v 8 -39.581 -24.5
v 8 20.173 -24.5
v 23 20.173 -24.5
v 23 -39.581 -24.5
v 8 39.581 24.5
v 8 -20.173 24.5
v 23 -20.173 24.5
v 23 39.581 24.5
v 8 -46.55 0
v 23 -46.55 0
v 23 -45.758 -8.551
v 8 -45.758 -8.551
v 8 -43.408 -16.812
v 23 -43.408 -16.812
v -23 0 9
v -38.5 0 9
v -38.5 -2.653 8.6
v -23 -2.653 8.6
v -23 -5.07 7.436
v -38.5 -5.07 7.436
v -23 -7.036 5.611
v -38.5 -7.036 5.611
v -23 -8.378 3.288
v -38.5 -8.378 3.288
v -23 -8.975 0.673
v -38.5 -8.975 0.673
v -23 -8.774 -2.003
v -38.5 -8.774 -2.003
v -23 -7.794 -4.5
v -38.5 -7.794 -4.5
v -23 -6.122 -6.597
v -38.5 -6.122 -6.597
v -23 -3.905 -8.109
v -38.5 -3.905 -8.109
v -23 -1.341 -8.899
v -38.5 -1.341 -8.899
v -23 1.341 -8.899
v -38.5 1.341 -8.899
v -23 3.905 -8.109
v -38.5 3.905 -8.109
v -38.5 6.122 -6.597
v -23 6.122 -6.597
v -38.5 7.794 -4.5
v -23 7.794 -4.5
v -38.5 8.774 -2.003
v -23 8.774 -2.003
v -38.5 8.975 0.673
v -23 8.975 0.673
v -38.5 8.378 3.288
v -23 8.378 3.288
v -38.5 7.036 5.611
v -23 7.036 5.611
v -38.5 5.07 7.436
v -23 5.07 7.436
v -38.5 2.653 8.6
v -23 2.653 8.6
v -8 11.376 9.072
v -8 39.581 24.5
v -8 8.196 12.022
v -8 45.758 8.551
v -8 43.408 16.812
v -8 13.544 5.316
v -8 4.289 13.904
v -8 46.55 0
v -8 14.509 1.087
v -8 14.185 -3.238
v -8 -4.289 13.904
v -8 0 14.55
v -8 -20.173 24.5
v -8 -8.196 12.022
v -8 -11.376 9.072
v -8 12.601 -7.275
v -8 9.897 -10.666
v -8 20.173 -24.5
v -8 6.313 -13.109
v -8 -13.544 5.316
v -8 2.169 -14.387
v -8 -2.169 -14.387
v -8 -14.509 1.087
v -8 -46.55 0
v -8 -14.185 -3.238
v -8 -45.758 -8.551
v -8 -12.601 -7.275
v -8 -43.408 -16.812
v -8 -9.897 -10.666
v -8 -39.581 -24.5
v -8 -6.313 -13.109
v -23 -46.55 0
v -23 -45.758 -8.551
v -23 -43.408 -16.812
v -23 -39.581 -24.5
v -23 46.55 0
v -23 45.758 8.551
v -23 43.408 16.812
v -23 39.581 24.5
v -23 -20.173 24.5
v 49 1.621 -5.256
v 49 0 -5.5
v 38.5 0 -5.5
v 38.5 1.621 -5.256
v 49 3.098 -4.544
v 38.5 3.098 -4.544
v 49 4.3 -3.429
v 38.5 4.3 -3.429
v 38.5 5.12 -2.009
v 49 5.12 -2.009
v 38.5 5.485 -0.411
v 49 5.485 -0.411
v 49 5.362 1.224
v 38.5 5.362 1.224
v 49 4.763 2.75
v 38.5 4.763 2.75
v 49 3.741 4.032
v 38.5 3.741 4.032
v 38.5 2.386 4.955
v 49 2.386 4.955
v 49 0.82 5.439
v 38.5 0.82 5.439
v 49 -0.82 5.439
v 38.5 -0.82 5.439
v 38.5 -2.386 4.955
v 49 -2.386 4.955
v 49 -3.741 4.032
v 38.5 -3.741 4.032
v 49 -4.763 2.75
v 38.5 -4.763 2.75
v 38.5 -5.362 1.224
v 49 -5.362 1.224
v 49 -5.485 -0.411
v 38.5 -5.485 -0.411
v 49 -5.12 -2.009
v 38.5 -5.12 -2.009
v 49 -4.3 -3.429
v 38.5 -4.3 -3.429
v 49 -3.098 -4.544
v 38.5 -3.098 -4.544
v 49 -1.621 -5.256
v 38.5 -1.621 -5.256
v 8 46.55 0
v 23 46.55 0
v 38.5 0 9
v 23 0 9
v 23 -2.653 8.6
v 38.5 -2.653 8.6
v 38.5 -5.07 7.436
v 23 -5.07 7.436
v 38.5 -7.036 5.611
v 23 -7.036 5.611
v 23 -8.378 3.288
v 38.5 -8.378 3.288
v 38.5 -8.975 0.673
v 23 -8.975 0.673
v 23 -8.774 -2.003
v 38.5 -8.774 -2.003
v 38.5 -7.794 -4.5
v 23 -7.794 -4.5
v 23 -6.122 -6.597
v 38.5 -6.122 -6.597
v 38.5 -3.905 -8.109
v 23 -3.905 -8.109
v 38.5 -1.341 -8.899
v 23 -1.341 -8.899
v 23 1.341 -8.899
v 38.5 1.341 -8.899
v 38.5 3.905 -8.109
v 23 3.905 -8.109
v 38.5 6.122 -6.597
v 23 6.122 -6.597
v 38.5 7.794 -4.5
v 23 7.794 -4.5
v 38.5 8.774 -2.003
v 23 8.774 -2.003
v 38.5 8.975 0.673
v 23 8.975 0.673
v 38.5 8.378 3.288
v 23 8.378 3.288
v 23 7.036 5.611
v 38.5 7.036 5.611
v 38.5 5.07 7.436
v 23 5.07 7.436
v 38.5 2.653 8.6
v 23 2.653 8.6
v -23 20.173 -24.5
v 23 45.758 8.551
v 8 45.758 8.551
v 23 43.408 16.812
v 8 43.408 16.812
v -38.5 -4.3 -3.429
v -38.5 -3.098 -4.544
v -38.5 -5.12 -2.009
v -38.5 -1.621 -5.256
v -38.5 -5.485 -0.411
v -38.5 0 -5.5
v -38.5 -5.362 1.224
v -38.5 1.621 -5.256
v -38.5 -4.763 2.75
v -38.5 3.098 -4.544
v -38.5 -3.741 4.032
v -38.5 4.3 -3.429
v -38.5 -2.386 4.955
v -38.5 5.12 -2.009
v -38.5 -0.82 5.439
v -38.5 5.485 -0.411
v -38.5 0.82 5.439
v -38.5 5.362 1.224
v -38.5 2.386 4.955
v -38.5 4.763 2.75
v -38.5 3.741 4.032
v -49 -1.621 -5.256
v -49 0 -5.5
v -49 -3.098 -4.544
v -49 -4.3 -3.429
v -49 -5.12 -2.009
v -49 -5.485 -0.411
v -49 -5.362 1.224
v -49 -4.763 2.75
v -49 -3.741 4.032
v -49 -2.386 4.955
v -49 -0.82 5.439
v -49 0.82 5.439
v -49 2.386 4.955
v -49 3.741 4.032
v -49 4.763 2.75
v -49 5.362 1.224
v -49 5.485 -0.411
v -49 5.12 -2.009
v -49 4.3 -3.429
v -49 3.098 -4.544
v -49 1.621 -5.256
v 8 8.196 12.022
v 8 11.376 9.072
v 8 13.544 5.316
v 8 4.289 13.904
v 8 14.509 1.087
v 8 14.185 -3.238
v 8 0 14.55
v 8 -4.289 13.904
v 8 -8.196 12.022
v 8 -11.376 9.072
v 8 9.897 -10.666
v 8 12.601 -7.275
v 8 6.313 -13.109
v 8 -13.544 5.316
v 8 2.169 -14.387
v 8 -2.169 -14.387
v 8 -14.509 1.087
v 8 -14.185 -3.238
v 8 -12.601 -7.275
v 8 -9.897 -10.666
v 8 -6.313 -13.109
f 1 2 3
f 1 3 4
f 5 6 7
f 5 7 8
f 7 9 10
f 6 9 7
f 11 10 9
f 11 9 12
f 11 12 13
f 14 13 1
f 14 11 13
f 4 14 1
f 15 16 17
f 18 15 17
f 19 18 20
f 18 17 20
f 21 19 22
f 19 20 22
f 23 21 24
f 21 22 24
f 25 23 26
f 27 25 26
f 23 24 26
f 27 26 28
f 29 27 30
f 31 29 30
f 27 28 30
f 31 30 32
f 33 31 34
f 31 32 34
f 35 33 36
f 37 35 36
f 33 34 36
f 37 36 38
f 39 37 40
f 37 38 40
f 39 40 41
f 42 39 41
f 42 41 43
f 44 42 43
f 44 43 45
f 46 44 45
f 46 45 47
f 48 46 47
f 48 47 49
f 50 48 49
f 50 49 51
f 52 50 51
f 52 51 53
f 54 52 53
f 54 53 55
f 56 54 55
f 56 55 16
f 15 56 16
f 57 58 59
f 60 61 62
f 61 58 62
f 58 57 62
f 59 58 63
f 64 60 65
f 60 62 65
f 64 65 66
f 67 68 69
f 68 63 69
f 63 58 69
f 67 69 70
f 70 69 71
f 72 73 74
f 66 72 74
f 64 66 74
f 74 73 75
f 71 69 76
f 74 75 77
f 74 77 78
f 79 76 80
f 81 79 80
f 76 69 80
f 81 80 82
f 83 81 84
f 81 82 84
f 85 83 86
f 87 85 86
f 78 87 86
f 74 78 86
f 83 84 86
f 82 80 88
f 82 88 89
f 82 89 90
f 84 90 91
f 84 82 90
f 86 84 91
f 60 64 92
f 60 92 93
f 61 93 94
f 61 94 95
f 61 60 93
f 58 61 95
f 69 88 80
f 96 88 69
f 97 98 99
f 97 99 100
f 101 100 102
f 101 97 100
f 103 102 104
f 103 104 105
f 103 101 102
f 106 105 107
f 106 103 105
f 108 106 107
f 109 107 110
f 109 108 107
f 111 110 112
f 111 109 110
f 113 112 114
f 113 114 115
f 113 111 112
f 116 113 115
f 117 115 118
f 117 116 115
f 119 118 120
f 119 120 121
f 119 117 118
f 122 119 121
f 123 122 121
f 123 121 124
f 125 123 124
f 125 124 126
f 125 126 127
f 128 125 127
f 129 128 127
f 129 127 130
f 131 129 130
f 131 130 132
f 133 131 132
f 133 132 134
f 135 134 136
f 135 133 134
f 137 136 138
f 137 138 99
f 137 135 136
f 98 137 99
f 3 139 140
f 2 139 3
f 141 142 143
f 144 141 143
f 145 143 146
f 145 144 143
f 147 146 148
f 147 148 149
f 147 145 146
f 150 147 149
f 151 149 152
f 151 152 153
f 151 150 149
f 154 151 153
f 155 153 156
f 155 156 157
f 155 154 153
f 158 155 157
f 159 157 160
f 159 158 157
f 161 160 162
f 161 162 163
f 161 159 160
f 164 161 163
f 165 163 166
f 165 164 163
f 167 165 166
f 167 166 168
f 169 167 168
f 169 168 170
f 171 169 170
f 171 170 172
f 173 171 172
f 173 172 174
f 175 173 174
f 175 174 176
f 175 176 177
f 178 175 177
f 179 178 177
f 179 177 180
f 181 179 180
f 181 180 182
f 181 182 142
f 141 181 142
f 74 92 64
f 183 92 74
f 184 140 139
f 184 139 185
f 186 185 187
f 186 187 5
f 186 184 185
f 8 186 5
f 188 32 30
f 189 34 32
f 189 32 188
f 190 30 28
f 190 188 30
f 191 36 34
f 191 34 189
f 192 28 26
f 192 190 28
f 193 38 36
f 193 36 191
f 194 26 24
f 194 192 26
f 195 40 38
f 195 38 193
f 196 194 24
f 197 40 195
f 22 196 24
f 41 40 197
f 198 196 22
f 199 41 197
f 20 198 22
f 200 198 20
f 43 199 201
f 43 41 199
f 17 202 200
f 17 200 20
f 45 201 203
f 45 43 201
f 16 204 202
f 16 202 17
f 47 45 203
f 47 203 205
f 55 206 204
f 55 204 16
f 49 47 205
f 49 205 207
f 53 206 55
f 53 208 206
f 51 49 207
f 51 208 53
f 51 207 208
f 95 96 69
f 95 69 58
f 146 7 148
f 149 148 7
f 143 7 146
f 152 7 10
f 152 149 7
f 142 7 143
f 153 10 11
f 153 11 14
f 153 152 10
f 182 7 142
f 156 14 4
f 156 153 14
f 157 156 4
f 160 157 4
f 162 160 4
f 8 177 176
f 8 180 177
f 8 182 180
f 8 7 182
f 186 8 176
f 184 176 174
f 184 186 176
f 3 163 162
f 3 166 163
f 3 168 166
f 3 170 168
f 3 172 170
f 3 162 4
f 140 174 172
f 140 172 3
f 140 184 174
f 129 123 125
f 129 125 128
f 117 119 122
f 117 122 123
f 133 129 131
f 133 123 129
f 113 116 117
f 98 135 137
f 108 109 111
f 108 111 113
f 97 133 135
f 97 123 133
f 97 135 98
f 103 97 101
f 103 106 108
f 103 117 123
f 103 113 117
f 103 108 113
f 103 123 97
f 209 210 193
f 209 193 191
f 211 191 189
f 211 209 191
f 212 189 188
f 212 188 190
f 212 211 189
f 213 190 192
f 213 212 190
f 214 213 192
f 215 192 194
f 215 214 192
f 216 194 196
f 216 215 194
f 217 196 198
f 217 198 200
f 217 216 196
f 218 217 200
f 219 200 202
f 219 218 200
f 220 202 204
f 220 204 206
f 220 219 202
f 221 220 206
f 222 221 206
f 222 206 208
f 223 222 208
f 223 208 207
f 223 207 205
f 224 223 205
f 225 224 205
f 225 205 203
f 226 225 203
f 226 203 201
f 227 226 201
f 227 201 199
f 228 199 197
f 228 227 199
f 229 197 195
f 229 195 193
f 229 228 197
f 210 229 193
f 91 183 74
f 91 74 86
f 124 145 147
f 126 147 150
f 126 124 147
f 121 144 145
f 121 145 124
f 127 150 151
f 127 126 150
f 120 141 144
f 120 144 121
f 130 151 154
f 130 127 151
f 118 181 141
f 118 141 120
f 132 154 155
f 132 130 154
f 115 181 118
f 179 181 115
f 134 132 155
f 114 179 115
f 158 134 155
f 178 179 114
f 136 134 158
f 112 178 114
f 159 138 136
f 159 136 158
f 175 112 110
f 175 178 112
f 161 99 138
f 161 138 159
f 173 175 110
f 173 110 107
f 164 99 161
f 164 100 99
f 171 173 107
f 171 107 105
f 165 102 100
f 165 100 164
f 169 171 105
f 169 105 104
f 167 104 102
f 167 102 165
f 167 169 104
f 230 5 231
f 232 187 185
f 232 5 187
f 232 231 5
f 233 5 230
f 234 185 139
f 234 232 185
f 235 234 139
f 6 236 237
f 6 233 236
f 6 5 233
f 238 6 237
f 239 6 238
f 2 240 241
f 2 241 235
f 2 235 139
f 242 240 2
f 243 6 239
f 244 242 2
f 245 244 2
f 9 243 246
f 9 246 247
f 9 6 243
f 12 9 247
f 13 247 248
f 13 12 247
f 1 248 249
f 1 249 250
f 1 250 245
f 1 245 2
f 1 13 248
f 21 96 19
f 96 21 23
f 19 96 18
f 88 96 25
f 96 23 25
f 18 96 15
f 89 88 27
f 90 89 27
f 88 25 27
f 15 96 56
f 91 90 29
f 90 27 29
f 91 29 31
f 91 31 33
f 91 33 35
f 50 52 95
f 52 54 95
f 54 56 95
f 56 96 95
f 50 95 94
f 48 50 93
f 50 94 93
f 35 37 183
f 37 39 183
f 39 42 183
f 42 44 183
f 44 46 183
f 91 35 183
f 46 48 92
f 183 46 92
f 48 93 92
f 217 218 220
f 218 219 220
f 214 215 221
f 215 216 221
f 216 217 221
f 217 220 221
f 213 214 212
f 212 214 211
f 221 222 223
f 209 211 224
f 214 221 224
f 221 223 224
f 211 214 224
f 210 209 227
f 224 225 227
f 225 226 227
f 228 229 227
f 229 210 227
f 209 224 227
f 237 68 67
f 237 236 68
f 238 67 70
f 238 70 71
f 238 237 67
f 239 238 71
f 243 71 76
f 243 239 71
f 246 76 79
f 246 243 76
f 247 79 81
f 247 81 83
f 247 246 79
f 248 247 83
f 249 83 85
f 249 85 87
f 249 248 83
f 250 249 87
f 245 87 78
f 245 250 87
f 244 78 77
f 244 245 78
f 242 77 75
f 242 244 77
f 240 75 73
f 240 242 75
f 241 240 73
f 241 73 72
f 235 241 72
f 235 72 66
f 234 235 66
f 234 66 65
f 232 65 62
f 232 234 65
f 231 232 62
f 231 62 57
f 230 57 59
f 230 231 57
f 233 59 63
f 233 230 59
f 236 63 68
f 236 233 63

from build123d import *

# Parameters (mm, degrees)
ESBO_O1_R                  = 46.55
RESSALTO_EXTRUS_O1_DEPTH   = 49
CORTE_EXTRUS_O2_DEPTH      = 83.0658577
CORTE_EXTRUS_O2_DEPTH_BACK = 83.0658577
CORTE_EXTRUS_O10_START     = -49
ESBO_O3_OUTSIDE_W          = 79.756
ESBO_O3_OUTSIDE_H          = 123.856
ESBO_O3_OUTSIDE_R          = 9
CORTE_EXTRUS_O10_DEPTH     = 26
CORTE_EXTRUS_O11_START     = 49
ESBO_O6_OUTSIDE_W          = 79.756
ESBO_O6_OUTSIDE_H          = 123.856
ESBO_O6_OUTSIDE_R          = 9
CORTE_EXTRUS_O11_DEPTH     = 26
ESBO_O7_OUTSIDE_W          = 79.756
ESBO_O7_OUTSIDE_H          = 123.856
ESBO_O7_OUTSIDE_R          = 5.5
CORTE_EXTRUS_O12_DEPTH     = 10.5
ESBO_O8_OUTSIDE_W          = 79.756
ESBO_O8_OUTSIDE_H          = 123.856
ESBO_O8_OUTSIDE_R          = 5.5
CORTE_EXTRUS_O13_DEPTH     = 10.5
ESBO_O9_W                  = 16
ESBO_O9_H                  = 36.861601527


with BuildPart() as part:
    # Esboço1 → Ressalto-extrusão1 (new, symmetric)
    with BuildSketch(Plane(origin=(0, 0, 0), x_dir=(0, 0, -1), z_dir=(1, 0, 0))):
        Circle(ESBO_O1_R)
    extrude(amount=RESSALTO_EXTRUS_O1_DEPTH, both=True)

    # Esboço2 → Corte-extrusão2 (cut, two sides: drawn at the far end of the back side and taken through both)
    with BuildSketch(Plane(origin=(0, 0, 0), x_dir=(0, 0, -1), z_dir=(1, 0, 0)).offset(-CORTE_EXTRUS_O2_DEPTH_BACK)):
        with BuildLine():
            Line((-24.5, -20.172926622), (-24.5, 39.580961332))
            ThreePointArc((-24.5, 39.580961332), (-46.55, 0), (-24.5, -39.580961332))
            Line((-24.5, -39.580961332), (-24.5, -20.172926622))
        make_face()
        with BuildLine():
            ThreePointArc((-24.5, -39.580961332), (-12.735948139, -44.773855374), (0, -46.55))
            Line((0, -46.55), (-24.5, -20.172926622))
            Line((-24.5, -20.172926622), (-24.5, -39.580961332))
        make_face()
        with BuildLine():
            ThreePointArc((46.55, 0), (40.665572048, 22.654221461), (24.5, 39.580961332))
            Line((24.5, 39.580961332), (24.5, 20.172926622))
            Line((24.5, 20.172926622), (24.5, -39.580961332))
            ThreePointArc((24.5, -39.580961332), (40.665572048, -22.654221461), (46.55, 0))
        make_face()
        with BuildLine():
            Line((24.5, 20.172926622), (24.5, 39.580961332))
            ThreePointArc((24.5, 39.580961332), (12.735948139, 44.773855374), (0, 46.55))
            Line((0, 46.55), (24.5, 20.172926622))
        make_face()
    extrude(amount=CORTE_EXTRUS_O2_DEPTH + CORTE_EXTRUS_O2_DEPTH_BACK, mode=Mode.SUBTRACT)

    # Esboço3 outside → Corte-extrusão10 (cut)
    with BuildSketch(Plane(origin=(0, 0, 0), x_dir=(0, 0, -1), z_dir=(1, 0, 0)).offset(CORTE_EXTRUS_O10_START)):
        Rectangle(ESBO_O3_OUTSIDE_W, ESBO_O3_OUTSIDE_H)
        with Locations(Location((0, 0, 0), (0, 0, 180))):
            Circle(ESBO_O3_OUTSIDE_R, mode=Mode.SUBTRACT)
    extrude(amount=CORTE_EXTRUS_O10_DEPTH, mode=Mode.SUBTRACT)

    # Esboço6 outside → Corte-extrusão11 (cut)
    with BuildSketch(Plane(origin=(0, 0, 0), x_dir=(0, 0, -1), z_dir=(1, 0, 0)).offset(CORTE_EXTRUS_O11_START)):
        Rectangle(ESBO_O6_OUTSIDE_W, ESBO_O6_OUTSIDE_H)
        with Locations(Location((0, 0, 0), (0, 0, 180))):
            Circle(ESBO_O6_OUTSIDE_R, mode=Mode.SUBTRACT)
    extrude(amount=-CORTE_EXTRUS_O11_DEPTH, mode=Mode.SUBTRACT)

    # Esboço7 outside → Corte-extrusão12 (cut)
    with BuildSketch(Plane(origin=(49, 0, 0), x_dir=(0, 0, -1), z_dir=(1, 0, 0))):
        Rectangle(ESBO_O7_OUTSIDE_W, ESBO_O7_OUTSIDE_H)
        Circle(ESBO_O7_OUTSIDE_R, mode=Mode.SUBTRACT)
    extrude(amount=-CORTE_EXTRUS_O12_DEPTH, mode=Mode.SUBTRACT)

    # Esboço8 outside → Corte-extrusão13 (cut)
    with BuildSketch(Plane.ZY.offset(49)):
        Rectangle(ESBO_O8_OUTSIDE_W, ESBO_O8_OUTSIDE_H)
        with Locations(Location((0, 0, 0), (0, 0, 180))):
            Circle(ESBO_O8_OUTSIDE_R, mode=Mode.SUBTRACT)
    extrude(amount=-CORTE_EXTRUS_O13_DEPTH, mode=Mode.SUBTRACT)

    # Esboço9 → Corte-Revolução1 (revolve, cut)
    with BuildSketch(Plane.XY, mode=Mode.PRIVATE) as corte_revolu_o1_sk:
        with Locations((0, 32.980800763)):
            Rectangle(ESBO_O9_W, ESBO_O9_H)
    revolve(corte_revolu_o1_sk.sketch.rotate(Axis((-1000, 0, 0), (1, 0, 0)), 90), axis=Axis((-1000, 0, 0), (1, 0, 0)), mode=Mode.SUBTRACT)


solid = part.part
